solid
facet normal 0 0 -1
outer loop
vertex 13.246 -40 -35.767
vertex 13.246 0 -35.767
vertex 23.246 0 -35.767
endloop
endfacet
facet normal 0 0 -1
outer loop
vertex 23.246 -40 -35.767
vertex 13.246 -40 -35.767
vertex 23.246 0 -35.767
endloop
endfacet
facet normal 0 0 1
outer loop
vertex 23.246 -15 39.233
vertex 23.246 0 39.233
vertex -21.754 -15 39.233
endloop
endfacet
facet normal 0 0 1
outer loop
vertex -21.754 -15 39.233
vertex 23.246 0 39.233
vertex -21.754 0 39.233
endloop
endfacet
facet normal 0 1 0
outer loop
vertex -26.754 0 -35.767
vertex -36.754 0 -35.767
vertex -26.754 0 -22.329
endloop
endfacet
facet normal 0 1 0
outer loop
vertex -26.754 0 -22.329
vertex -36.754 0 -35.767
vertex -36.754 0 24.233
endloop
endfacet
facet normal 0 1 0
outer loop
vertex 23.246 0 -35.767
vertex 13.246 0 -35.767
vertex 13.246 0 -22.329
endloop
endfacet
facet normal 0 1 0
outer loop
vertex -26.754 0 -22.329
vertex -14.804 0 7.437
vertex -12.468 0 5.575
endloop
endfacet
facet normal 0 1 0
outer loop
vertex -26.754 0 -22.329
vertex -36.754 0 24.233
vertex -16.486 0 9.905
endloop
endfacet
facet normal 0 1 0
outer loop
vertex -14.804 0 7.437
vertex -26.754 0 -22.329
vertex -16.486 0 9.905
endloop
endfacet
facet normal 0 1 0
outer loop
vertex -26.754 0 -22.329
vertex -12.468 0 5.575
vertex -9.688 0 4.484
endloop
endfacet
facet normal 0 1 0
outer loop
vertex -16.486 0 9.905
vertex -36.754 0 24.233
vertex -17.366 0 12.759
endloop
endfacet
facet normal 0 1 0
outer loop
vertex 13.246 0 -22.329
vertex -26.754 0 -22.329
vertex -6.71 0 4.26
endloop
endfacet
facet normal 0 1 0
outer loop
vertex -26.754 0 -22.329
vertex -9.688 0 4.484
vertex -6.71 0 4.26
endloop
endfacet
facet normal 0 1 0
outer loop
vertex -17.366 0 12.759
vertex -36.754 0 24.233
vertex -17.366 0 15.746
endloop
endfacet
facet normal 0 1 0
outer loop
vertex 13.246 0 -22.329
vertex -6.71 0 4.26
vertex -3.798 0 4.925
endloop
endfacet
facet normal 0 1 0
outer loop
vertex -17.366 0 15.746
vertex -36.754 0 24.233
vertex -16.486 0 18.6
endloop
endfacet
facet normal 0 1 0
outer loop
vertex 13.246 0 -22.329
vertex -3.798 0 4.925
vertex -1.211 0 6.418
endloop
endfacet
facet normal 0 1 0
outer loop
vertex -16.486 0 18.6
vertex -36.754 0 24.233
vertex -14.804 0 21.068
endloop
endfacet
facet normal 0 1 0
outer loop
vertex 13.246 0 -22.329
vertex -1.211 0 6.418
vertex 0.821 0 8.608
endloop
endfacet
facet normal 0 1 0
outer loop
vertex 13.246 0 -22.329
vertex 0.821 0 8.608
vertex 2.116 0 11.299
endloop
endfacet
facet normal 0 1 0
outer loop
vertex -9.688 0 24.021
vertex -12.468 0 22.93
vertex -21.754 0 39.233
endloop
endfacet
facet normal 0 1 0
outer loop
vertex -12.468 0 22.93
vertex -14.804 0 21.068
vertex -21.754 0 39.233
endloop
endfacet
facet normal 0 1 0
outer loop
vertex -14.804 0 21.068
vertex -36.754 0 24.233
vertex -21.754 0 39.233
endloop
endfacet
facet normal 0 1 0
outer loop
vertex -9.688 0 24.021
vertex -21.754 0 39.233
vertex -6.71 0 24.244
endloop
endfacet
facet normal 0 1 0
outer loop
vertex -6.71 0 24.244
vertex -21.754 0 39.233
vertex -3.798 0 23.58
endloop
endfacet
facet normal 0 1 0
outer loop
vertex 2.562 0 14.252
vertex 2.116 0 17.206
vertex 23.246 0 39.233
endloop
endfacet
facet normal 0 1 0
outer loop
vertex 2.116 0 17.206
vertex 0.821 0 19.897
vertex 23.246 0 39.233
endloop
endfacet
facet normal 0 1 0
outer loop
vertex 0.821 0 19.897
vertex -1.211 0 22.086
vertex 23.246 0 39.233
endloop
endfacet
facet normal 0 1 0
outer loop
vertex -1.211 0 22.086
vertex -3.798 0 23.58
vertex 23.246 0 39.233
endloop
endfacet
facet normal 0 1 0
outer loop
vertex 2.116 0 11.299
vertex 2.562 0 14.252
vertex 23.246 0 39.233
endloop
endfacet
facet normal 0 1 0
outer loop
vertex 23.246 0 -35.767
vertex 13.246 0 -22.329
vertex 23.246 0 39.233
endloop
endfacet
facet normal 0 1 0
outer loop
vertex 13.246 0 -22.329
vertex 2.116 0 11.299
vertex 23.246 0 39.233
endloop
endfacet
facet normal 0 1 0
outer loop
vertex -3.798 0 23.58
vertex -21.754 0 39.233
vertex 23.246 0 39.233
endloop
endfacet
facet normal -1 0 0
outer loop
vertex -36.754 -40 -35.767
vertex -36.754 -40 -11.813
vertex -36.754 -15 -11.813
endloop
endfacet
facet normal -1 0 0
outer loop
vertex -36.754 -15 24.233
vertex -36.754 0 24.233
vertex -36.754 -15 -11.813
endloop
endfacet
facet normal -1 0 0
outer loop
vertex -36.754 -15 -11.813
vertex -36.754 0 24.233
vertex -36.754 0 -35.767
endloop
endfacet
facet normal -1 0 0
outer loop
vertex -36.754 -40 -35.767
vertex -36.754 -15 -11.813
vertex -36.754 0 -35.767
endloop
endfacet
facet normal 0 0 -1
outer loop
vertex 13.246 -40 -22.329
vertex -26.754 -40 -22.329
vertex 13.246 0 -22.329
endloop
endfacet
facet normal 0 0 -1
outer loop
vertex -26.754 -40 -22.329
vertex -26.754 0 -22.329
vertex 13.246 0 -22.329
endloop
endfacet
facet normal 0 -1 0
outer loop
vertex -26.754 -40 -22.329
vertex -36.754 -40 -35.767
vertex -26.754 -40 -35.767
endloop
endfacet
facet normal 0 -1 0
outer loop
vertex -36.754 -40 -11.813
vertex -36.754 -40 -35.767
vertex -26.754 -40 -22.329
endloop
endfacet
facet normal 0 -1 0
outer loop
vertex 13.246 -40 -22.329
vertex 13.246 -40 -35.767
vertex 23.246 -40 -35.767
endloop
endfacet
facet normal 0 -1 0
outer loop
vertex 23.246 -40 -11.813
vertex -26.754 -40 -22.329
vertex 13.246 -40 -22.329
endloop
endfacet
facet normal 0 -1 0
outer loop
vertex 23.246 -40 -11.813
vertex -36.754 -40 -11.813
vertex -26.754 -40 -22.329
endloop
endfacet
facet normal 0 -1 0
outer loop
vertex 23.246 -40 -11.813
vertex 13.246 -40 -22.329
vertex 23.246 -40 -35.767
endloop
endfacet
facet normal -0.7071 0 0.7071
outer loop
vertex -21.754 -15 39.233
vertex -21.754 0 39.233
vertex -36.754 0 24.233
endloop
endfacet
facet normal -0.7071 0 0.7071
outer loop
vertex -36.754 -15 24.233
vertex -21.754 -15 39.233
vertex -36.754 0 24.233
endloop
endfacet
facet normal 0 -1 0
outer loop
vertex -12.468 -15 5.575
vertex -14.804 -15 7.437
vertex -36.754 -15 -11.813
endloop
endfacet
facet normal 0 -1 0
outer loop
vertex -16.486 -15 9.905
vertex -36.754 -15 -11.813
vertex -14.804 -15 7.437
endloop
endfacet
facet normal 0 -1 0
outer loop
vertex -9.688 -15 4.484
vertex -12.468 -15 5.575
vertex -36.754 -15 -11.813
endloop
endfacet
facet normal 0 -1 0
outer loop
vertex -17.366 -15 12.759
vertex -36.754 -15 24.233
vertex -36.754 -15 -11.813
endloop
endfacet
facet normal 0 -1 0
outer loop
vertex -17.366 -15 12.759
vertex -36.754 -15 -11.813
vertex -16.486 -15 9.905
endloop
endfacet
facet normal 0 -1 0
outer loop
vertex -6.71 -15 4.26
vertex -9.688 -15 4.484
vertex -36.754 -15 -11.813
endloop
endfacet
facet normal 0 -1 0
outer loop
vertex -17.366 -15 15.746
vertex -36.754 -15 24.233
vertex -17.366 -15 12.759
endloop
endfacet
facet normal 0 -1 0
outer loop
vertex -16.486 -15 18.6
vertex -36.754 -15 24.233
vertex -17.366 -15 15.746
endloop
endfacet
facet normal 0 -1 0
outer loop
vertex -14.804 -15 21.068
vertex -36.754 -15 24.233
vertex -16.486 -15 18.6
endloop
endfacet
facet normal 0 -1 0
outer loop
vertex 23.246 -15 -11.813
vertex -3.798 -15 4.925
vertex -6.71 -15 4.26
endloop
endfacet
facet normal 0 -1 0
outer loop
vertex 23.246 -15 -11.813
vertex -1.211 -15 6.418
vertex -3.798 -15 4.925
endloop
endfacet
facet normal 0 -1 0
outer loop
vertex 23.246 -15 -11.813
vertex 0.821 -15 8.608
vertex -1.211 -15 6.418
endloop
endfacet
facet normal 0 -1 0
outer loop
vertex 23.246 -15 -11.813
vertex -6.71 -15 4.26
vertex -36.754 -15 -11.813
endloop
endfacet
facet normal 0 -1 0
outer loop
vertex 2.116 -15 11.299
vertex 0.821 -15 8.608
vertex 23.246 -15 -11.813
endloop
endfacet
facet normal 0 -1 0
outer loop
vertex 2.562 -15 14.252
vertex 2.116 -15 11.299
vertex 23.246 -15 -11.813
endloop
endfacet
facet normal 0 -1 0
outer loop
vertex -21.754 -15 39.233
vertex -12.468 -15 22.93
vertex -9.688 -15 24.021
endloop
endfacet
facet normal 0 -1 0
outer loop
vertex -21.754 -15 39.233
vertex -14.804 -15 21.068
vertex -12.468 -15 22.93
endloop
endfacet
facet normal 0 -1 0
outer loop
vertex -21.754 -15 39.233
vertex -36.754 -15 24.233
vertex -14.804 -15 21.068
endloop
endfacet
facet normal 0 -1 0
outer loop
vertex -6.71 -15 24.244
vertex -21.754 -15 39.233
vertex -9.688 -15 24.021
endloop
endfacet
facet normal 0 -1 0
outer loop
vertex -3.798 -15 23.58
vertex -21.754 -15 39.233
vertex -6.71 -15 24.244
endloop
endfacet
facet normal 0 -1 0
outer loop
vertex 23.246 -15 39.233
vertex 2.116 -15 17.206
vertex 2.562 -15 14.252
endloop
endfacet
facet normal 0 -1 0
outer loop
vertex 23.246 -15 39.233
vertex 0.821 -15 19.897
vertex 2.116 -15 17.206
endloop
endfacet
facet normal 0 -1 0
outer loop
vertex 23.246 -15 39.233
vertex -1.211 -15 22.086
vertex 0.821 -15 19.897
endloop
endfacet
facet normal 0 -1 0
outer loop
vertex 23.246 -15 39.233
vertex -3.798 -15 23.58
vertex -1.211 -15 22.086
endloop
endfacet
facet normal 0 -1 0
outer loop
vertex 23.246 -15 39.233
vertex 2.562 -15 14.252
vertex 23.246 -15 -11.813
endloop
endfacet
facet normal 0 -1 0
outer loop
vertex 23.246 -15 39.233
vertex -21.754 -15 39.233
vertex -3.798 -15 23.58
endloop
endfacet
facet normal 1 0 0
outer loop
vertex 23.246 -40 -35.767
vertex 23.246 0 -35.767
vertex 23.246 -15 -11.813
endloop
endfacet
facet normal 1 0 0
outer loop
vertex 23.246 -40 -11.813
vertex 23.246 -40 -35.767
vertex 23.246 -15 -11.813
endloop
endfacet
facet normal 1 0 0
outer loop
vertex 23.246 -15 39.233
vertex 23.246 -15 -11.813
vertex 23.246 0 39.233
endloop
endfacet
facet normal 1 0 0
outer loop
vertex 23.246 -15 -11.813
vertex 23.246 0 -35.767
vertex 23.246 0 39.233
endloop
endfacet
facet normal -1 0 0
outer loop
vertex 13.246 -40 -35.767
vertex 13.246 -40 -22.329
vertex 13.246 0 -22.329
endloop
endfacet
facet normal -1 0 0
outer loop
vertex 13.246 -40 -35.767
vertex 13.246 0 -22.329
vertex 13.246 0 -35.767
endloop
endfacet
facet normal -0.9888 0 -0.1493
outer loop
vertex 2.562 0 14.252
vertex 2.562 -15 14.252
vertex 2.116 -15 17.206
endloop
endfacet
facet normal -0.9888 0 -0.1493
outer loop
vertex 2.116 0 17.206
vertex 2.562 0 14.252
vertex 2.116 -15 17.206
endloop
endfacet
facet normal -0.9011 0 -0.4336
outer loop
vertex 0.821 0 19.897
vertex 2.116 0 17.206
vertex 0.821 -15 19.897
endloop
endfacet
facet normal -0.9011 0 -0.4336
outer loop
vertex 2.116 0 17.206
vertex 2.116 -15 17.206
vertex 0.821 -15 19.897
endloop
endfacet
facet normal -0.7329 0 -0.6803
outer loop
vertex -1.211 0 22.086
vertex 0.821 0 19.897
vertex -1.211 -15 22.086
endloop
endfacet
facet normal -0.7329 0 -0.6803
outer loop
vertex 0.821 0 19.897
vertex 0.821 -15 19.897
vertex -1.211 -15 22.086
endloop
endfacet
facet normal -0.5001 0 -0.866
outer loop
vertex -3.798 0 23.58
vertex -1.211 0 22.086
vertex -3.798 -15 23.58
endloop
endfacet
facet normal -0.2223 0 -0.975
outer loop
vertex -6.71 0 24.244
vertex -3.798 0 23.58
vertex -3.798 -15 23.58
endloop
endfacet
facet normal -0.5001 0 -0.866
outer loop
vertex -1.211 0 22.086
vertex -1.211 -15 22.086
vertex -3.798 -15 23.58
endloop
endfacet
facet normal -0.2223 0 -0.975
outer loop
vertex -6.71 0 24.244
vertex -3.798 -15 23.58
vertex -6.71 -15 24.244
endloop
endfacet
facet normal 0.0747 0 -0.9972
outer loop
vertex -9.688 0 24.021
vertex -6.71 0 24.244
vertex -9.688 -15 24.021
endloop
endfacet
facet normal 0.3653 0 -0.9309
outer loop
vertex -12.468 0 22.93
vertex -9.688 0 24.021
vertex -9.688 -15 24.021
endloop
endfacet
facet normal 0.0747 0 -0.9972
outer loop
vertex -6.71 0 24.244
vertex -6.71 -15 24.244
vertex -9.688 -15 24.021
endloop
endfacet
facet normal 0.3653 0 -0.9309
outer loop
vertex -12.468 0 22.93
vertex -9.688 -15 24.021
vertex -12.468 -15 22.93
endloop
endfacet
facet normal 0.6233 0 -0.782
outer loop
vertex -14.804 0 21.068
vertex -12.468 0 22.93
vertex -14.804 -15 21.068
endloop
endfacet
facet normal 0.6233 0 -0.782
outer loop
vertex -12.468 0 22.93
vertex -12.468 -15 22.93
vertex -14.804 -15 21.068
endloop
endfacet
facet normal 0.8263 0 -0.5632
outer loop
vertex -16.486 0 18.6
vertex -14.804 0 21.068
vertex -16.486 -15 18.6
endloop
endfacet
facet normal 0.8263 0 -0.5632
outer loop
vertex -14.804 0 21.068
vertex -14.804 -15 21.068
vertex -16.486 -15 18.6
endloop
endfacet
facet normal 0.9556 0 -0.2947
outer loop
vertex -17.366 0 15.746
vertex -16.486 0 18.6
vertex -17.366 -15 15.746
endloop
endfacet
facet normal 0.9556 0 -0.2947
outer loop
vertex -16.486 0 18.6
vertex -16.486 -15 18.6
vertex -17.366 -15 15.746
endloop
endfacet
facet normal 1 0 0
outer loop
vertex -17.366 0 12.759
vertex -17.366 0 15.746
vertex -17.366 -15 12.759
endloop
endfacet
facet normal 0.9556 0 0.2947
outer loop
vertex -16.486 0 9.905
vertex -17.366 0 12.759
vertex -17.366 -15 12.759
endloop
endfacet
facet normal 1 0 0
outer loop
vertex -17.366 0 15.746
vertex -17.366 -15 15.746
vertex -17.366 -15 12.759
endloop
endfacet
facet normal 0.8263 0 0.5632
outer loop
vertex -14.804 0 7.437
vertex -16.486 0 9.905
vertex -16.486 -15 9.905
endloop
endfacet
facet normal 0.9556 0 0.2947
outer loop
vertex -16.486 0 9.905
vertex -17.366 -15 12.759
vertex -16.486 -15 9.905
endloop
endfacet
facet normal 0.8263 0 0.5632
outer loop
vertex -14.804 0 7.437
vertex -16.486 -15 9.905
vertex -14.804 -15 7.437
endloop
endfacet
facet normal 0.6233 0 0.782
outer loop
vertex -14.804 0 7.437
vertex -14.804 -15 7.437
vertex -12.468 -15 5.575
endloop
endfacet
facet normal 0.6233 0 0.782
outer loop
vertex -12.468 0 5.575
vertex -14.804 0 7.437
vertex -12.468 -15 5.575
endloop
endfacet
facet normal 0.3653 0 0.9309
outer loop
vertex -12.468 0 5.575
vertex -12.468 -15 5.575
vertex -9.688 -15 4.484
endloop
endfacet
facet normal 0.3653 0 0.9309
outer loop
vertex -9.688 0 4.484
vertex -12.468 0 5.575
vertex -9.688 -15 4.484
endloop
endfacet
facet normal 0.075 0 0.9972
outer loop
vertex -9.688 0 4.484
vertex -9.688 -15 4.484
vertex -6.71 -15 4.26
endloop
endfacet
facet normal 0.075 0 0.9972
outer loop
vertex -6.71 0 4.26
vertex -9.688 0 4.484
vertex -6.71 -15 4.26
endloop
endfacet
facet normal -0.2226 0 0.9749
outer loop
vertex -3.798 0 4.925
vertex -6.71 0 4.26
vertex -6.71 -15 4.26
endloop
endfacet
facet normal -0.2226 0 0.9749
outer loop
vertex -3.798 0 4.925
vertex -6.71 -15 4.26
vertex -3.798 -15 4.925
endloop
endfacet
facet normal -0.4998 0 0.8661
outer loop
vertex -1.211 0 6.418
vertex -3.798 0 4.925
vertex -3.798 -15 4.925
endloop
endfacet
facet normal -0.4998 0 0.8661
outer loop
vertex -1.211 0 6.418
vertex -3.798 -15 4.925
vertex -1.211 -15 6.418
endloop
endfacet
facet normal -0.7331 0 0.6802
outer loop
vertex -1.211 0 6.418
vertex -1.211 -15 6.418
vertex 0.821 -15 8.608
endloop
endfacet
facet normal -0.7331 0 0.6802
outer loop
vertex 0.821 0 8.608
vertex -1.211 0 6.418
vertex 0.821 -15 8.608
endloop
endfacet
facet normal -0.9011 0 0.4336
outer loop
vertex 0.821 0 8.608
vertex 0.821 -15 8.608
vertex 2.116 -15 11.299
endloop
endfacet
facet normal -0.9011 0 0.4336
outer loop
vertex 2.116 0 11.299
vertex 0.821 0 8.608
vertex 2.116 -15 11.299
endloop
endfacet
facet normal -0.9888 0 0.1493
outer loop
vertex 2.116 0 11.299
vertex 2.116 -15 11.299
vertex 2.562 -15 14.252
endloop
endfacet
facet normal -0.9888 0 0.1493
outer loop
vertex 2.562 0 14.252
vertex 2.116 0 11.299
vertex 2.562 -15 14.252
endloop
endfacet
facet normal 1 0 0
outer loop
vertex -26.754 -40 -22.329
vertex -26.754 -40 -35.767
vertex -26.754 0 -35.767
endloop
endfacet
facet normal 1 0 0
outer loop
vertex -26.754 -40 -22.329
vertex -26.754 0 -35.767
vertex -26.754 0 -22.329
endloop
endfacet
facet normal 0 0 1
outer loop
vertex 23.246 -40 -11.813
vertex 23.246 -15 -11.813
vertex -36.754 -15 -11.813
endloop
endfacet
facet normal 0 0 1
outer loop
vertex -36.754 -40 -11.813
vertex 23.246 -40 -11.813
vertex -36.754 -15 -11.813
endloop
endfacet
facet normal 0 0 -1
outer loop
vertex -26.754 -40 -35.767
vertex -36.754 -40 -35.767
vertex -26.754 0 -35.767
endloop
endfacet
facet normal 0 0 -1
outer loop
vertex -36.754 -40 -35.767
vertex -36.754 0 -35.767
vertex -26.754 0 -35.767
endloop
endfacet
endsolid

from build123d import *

# Parameters (mm, degrees)
F1_DEPTH = 15
F3_DEPTH = 25
F4_R     = 10.019997
F5_DEPTH = 25


with BuildPart() as f1:
    # F0 (on Front) → F1 (new body)
    with BuildSketch(Plane.XZ):
        Polygon((-21.754347, 39.233197), (-36.754347, 24.233197), (-36.754347, -35.766803), (-26.754347, -35.766803), (-26.754347, -22.329369), (13.245653, -22.329369), (13.245653, -35.766803), (23.245653, -35.766803), (23.245653, 39.233197), align=None)
    extrude(amount=F1_DEPTH)

    # F2 (on face) → F3 (join)
    with BuildSketch(Plane.XZ.offset(15)):
        Polygon((23.245653, -11.812501), (-36.754347, -11.812501), (-36.754347, -35.766803), (-26.754347, -35.766803), (-26.754347, -22.329369), (13.245653, -22.329369), (13.245653, -35.766803), (23.245653, -35.766803), align=None)
    extrude(amount=F3_DEPTH)

    # F4 (on face) → F5 (cut)
    with BuildSketch(Plane.XZ.offset(15)):
        with Locations((-7.458407, 14.252321)):
            Circle(F4_R)
    extrude(amount=-F5_DEPTH, mode=Mode.SUBTRACT)


solid = f1.part
